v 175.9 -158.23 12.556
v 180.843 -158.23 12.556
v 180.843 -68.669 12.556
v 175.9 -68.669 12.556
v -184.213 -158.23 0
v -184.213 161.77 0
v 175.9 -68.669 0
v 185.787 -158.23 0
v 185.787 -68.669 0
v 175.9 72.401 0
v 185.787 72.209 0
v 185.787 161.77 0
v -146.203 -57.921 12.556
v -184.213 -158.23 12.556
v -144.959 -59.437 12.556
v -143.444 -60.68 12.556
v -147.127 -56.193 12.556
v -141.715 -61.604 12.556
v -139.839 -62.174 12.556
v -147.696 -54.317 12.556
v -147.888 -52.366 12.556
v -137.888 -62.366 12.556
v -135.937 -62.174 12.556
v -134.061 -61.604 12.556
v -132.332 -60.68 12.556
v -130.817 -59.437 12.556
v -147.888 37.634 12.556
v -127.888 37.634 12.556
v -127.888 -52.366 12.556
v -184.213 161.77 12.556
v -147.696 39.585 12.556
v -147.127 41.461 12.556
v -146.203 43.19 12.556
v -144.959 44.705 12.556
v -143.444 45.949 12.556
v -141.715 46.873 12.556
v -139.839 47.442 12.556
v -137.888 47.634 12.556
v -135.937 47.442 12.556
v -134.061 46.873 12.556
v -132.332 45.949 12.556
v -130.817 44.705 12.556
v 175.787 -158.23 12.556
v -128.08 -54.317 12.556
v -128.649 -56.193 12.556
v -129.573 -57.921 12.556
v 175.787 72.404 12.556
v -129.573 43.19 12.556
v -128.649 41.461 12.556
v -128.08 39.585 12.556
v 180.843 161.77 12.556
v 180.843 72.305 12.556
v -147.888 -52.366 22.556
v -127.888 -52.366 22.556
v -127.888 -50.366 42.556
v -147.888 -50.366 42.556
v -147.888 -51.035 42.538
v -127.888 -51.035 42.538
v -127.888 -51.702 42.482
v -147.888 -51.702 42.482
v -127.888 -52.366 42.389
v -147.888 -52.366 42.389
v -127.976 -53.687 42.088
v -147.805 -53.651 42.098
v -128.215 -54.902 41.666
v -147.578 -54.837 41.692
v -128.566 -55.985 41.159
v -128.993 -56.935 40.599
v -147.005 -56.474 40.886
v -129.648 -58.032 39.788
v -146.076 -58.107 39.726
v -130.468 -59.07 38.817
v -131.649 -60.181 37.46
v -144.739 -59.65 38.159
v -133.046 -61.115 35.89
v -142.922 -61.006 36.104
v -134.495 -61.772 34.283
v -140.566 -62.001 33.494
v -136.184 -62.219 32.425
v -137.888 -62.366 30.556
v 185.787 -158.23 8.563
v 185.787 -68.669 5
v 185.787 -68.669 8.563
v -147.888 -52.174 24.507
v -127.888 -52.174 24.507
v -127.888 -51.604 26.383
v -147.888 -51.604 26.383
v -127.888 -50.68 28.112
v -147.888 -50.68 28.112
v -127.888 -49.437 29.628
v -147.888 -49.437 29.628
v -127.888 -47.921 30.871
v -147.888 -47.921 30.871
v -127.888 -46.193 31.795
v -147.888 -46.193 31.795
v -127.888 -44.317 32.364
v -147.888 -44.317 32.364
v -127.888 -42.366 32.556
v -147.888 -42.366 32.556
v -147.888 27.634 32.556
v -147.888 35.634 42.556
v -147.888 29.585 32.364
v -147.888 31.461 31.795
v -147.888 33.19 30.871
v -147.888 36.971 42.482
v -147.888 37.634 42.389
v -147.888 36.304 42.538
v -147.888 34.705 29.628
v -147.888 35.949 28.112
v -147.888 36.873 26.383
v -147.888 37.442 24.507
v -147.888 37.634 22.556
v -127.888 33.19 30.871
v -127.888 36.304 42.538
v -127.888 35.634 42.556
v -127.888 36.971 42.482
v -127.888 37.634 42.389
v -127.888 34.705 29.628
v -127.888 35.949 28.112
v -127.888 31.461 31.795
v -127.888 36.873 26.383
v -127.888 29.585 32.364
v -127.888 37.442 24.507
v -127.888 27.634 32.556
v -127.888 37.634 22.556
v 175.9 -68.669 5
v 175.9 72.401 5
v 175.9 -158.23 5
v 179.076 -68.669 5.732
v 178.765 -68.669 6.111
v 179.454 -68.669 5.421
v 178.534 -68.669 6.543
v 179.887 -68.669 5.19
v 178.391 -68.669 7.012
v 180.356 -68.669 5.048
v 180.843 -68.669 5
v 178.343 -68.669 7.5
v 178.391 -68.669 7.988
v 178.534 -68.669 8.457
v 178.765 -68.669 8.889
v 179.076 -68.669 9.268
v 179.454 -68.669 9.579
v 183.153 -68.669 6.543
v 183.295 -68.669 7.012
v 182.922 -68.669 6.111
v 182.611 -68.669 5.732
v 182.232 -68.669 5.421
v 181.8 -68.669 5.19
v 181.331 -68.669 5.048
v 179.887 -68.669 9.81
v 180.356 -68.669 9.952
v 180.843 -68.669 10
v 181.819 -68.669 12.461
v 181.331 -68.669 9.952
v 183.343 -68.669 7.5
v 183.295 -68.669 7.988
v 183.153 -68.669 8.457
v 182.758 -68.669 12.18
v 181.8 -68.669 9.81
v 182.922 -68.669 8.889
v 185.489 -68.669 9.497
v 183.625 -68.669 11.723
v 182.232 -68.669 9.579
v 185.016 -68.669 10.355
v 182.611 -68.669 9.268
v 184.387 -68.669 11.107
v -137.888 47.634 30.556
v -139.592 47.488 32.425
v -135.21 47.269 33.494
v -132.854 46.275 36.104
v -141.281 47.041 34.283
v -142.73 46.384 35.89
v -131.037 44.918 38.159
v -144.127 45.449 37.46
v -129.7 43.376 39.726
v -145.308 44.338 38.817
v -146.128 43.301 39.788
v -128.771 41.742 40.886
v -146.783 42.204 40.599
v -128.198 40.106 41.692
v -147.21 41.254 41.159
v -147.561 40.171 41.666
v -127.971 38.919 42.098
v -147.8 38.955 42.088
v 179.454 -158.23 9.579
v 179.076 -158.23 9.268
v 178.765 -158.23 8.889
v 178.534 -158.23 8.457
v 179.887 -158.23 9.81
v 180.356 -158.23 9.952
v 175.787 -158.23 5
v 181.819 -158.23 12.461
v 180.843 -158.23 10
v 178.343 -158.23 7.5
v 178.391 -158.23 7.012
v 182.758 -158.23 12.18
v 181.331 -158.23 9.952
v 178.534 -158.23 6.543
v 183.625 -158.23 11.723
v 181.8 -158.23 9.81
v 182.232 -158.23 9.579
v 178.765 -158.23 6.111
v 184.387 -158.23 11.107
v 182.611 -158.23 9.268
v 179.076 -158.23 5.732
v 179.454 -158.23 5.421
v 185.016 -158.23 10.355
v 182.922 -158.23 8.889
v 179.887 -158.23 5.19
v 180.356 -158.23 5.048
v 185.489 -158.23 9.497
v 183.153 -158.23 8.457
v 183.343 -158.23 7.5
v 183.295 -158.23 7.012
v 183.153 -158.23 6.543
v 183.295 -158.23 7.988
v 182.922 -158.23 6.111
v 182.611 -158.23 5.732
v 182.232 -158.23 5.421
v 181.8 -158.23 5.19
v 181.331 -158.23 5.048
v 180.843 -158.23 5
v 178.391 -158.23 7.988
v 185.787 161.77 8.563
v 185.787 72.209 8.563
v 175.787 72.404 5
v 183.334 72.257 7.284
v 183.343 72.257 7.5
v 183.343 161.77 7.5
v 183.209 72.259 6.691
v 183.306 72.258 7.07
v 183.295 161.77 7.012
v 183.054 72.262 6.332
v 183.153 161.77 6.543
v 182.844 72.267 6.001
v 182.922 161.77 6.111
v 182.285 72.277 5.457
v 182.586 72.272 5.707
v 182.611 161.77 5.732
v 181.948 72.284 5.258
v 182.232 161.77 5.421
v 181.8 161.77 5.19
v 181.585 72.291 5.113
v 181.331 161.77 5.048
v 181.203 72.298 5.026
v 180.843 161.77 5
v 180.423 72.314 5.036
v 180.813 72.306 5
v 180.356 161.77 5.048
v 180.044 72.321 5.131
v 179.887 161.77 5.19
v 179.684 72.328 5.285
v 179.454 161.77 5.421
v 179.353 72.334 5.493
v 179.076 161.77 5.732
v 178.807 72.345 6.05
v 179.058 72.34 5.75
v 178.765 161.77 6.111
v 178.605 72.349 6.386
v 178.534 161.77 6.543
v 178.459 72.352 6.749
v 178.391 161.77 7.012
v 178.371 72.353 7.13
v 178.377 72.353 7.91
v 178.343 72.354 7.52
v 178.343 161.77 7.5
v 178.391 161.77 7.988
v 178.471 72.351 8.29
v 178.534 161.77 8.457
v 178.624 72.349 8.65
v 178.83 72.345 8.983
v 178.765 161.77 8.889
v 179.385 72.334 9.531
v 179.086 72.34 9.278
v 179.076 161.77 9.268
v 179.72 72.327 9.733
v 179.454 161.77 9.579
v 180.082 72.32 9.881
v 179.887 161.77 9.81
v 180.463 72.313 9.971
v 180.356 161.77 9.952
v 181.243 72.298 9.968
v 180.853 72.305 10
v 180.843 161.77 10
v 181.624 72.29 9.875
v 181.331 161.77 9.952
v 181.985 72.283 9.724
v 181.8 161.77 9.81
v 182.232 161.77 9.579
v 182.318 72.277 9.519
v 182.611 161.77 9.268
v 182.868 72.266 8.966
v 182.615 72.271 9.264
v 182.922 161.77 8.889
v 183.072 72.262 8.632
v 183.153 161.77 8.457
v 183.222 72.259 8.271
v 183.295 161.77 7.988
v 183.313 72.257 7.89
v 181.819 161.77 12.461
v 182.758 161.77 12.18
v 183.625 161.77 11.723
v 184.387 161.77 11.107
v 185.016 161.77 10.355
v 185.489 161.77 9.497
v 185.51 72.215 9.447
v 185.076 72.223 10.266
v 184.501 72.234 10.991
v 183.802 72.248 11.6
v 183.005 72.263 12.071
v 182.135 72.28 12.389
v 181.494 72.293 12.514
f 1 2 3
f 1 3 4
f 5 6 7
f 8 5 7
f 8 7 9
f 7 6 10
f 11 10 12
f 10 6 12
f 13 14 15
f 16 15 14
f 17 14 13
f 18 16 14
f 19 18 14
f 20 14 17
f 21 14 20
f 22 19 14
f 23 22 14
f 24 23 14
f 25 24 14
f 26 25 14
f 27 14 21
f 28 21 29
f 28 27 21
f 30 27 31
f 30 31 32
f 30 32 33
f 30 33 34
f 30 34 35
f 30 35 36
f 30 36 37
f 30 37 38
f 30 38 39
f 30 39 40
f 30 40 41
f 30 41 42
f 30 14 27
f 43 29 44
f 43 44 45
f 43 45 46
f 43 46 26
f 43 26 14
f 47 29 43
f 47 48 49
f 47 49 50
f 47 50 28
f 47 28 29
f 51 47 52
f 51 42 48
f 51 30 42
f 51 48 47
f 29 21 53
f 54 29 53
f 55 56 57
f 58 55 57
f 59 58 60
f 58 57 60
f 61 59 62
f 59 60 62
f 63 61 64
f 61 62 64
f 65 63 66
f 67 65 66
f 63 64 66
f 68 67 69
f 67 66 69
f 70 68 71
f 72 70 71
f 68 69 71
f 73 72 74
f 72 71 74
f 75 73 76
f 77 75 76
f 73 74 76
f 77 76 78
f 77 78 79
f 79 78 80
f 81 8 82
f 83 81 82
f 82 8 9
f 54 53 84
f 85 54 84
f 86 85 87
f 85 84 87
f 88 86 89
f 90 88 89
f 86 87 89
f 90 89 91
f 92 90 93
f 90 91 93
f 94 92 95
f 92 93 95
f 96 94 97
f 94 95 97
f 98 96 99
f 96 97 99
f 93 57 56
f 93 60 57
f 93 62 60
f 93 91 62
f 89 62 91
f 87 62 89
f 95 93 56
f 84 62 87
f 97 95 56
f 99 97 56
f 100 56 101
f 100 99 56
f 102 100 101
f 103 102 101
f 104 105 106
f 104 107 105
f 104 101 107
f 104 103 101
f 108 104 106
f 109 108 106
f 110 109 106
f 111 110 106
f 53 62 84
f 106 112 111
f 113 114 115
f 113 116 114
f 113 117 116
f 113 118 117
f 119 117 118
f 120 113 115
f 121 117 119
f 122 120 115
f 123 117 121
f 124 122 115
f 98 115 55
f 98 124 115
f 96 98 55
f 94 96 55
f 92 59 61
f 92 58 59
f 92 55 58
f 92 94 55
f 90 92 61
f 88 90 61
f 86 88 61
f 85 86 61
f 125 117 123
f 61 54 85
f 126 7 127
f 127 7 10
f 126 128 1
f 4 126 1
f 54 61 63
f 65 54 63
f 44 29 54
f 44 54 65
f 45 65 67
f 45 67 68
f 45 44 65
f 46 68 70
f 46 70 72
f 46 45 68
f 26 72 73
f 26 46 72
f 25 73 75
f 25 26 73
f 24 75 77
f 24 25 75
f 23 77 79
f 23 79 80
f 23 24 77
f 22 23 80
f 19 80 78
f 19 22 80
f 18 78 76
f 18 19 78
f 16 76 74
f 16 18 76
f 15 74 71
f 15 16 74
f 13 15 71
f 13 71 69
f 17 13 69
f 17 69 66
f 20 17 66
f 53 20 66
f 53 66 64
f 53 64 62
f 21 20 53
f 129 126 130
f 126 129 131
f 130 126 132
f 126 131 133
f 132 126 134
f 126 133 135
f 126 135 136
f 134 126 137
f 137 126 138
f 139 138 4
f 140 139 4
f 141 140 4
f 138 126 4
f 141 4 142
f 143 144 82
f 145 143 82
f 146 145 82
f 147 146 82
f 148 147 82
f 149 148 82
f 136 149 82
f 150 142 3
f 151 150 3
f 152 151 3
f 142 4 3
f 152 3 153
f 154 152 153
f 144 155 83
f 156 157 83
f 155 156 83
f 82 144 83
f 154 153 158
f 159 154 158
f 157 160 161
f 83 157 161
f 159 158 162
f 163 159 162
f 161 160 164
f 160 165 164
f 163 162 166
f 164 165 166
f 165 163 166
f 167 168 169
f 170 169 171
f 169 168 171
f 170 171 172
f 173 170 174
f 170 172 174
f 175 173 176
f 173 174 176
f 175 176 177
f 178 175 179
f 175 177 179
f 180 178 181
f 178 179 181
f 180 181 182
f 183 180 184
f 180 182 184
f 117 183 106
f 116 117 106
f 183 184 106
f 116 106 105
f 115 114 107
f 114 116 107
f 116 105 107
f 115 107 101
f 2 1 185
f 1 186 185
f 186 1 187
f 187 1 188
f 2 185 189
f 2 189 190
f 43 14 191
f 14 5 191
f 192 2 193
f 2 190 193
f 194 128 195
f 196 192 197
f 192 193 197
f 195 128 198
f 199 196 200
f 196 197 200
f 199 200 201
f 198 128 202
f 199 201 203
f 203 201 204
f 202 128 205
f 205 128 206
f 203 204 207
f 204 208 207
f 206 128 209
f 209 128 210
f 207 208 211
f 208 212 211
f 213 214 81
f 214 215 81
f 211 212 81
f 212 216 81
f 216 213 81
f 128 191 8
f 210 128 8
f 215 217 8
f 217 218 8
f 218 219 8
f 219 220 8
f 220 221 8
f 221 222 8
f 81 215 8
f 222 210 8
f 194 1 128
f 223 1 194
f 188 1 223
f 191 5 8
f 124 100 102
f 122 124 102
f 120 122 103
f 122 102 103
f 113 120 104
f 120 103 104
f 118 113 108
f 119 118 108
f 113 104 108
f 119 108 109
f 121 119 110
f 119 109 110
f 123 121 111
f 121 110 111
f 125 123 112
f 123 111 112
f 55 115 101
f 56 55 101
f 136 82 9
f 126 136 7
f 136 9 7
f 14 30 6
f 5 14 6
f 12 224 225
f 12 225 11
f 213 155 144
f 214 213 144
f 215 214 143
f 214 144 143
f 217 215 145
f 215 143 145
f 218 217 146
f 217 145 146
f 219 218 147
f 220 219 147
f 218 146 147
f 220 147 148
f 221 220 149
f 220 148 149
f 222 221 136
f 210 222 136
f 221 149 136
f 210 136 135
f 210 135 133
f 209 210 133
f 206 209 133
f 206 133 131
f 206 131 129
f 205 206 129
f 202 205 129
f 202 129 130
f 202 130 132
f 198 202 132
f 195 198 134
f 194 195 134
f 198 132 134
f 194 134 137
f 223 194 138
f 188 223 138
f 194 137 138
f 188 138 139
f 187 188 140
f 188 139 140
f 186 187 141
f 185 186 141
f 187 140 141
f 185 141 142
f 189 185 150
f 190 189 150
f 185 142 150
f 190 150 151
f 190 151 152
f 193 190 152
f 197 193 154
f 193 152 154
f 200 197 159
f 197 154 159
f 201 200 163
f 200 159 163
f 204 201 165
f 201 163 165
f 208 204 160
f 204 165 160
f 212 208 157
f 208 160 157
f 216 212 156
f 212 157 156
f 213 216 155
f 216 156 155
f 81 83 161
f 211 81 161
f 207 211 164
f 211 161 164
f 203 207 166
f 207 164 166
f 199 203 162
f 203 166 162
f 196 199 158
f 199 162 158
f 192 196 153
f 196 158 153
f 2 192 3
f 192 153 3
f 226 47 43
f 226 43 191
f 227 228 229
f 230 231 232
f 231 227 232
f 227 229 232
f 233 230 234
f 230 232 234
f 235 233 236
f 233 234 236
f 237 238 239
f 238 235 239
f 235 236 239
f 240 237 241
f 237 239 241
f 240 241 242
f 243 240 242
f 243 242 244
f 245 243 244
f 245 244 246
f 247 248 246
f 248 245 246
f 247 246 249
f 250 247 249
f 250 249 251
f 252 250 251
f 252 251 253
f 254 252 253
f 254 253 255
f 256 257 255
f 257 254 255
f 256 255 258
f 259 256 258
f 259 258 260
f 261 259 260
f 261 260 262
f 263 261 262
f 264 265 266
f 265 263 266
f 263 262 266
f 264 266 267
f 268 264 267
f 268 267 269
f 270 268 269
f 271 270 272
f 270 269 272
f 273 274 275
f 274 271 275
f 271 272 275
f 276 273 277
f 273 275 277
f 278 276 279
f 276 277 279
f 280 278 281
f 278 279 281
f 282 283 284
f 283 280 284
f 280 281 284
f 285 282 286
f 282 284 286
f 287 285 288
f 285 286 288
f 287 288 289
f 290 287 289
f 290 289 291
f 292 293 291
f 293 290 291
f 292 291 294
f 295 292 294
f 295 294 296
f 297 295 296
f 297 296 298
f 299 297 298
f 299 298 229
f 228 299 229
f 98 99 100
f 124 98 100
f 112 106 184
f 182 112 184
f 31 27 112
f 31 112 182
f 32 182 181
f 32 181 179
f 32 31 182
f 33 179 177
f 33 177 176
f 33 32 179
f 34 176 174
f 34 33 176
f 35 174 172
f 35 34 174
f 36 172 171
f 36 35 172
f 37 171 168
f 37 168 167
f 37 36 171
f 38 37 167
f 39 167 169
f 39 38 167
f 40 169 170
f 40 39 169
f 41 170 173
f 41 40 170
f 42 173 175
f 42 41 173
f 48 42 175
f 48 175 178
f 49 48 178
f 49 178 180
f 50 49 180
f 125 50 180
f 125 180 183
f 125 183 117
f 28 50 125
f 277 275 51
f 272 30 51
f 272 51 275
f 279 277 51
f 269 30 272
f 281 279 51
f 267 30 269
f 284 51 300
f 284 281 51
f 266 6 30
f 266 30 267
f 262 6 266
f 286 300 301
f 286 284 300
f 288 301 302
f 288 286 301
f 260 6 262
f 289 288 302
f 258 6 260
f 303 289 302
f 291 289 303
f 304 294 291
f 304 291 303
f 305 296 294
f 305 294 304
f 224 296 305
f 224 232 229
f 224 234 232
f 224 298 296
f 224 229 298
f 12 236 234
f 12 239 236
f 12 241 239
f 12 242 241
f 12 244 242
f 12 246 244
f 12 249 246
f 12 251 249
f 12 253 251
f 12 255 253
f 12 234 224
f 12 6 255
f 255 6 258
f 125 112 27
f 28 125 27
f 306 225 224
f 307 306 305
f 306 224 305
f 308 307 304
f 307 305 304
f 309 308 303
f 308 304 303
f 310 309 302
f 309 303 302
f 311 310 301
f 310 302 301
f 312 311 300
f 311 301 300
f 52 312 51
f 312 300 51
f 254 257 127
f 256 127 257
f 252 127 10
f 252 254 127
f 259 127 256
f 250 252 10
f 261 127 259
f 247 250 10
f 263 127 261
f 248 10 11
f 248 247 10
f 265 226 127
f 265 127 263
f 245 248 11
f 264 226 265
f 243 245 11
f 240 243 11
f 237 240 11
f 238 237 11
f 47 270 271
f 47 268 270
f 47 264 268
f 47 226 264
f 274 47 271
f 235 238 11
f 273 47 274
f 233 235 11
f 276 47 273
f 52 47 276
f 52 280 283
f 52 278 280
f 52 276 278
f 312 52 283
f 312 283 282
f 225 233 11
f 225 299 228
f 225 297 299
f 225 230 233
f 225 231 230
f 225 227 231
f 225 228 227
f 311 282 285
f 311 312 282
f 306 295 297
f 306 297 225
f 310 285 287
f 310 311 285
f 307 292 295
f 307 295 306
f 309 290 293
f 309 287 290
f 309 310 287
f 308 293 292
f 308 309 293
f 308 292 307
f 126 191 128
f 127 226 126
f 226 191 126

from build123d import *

# Parameters (mm, degrees)
BOSS_EXTRUDE1_DEPTH = 5
BOSS_EXTRUDE2_REACH = 322
SKETCH2_W           = 10
SKETCH2_H           = 15
SKETCH3_W           = 9.887044096
SKETCH3_H           = 15
BOSS_EXTRUDE3_DEPTH = 89.560962
SKETCH4_R           = 2.5
CUT_EXTRUDE1_DEPTH  = 320
SKETCH5_W           = 360
SKETCH5_H           = 7.556477952
BOSS_EXTRUDE4_DEPTH = 320
BOSS_EXTRUDE5_DEPTH = 30
CUT_EXTRUDE2_DEPTH  = 30


with BuildPart() as part:
    # Sketch1 → Boss-Extrude1 (new body)
    with BuildSketch(Plane.XY):
        Polygon((175.89978938, 161.770375321), (-184.213166524, 161.770375321), (-184.213166524, -158.229624679), (175.89978938, -158.229624679), (185.786833476, -158.229624679), (185.786833476, -68.668662794), (175.89978938, -68.668662794), (175.89978938, 72.40143746), (185.786833476, 72.209413435), (185.786833476, 161.770375321), align=None)
    extrude(amount=BOSS_EXTRUDE1_DEPTH)

    # Boss-Extrude2: up to this face of the body (flat: up to its plane)
    boss_extrude2_end = Plane(part.part.faces().sort_by_distance((180.843311428, 72.305425448, 2.5))[0])
    # Sketch2 → Boss-Extrude2 (add, up to the picked face)
    with BuildSketch(Plane(origin=(0, 161.770375321, 0), x_dir=(1, 0, 0), z_dir=(0, 1, 0)), mode=Mode.PRIVATE) as boss_extrude2_sk1:
        with Locations((180.786833476, -7.5)):
            Rectangle(SKETCH2_W, SKETCH2_H)
    boss_extrude2_tool1 = split(extrude(boss_extrude2_sk1.sketch, amount=-BOSS_EXTRUDE2_REACH, mode=Mode.PRIVATE), bisect_by=boss_extrude2_end, keep=Keep.BOTH, mode=Mode.PRIVATE)
    add(boss_extrude2_tool1.solids().sort_by_distance((180.786833, 161.770375, 7.5))[0])

    # Sketch3 → Boss-Extrude3 (add)
    with BuildSketch(Plane.XZ.offset(158.229624679)):
        with Locations((180.843311428, 7.5)):
            Rectangle(SKETCH3_W, SKETCH3_H)
    extrude(amount=-BOSS_EXTRUDE3_DEPTH)

    # Sketch4 → Cut-Extrude1 (cut)
    with BuildSketch(Plane(origin=(0, 161.770375321, 0), x_dir=(1, 0, 0), z_dir=(0, 1, 0))):
        with Locations((180.843311428, -7.5)):
            Circle(SKETCH4_R)
        with BuildLine():
            Line((180.843311428, -12.556477952), (174.586681461, -12.556477952))
            Line((174.586681461, -12.556477952), (174.586681461, -18.742126007))
            Line((174.586681461, -18.742126007), (187.888181218, -19.204340284))
            Line((187.888181218, -19.204340284), (188.294895745, -7.5))
            Line((188.294895745, -7.5), (185.89978938, -7.5))
            ThreePointArc((185.89978938, -7.5), (184.418781277, -11.075469849), (180.843311428, -12.556477952))
        make_face()
    extrude(amount=-CUT_EXTRUDE1_DEPTH, mode=Mode.SUBTRACT)

    # Sketch5 → Boss-Extrude4 (add)
    with BuildSketch(Plane(origin=(0, 161.770375321, 0), x_dir=(1, 0, 0), z_dir=(0, 1, 0))):
        with Locations((-4.213166524, -8.778238976)):
            Rectangle(SKETCH5_W, SKETCH5_H)
    extrude(amount=-BOSS_EXTRUDE4_DEPTH)

    # Sketch6 → Boss-Extrude5 (add)
    with BuildSketch(Plane.XY.offset(12.556477952)):
        with BuildLine():
            Line((-127.887955303, 37.634320881), (-127.887955303, -52.365679119))
            ThreePointArc((-127.887955303, -52.365679119), (-137.887955303, -62.365679119), (-147.887955303, -52.365679119))
            Line((-147.887955303, -52.365679119), (-147.887955303, 37.634320881))
            ThreePointArc((-147.887955303, 37.634320881), (-137.887955303, 47.634320881), (-127.887955303, 37.634320881))
        make_face()
    extrude(amount=BOSS_EXTRUDE5_DEPTH)

    # Sketch7 → Cut-Extrude2 (cut)
    with BuildSketch(Plane.ZY.offset(147.887955303)):
        with BuildLine():
            Line((12.556477952, 47.634320881), (30.556477952, 47.634320881))
            ThreePointArc((30.556477952, 47.634320881), (39.041759326, 44.119602255), (42.556477952, 35.634320881))
            Line((42.556477952, 35.634320881), (42.556477952, -50.365679119))
            ThreePointArc((42.556477952, -50.365679119), (39.041759326, -58.850960494), (30.556477952, -62.365679119))
            Line((30.556477952, -62.365679119), (12.556477952, -62.365679119))
            Line((12.556477952, -62.365679119), (12.556477952, -84.546006254))
            Line((12.556477952, -84.546006254), (75.194935331, -84.546006254))
            Line((75.194935331, -84.546006254), (75.194935331, -40.351574991))
            Line((75.194935331, -40.351574991), (70.864672609, 64.078414926))
            Line((70.864672609, 64.078414926), (12.556477952, 64.078414926))
            Line((12.556477952, 64.078414926), (12.556477952, 47.634320881))
        make_face()
        with BuildLine():
            Line((32.556477952, -7.365679119), (32.556477952, 27.634320881))
            ThreePointArc((32.556477952, 27.634320881), (29.627545764, 34.705388692), (22.556477952, 37.634320881))
            Line((22.556477952, 37.634320881), (12.556477952, 37.634320881))
            Line((12.556477952, 37.634320881), (12.556477952, -52.365679119))
            Line((12.556477952, -52.365679119), (22.556477952, -52.365679119))
            ThreePointArc((22.556477952, -52.365679119), (29.627545764, -49.436746931), (32.556477952, -42.365679119))
            Line((32.556477952, -42.365679119), (32.556477952, -7.365679119))
        make_face()
    extrude(amount=-CUT_EXTRUDE2_DEPTH, mode=Mode.SUBTRACT)


solid = part.part
